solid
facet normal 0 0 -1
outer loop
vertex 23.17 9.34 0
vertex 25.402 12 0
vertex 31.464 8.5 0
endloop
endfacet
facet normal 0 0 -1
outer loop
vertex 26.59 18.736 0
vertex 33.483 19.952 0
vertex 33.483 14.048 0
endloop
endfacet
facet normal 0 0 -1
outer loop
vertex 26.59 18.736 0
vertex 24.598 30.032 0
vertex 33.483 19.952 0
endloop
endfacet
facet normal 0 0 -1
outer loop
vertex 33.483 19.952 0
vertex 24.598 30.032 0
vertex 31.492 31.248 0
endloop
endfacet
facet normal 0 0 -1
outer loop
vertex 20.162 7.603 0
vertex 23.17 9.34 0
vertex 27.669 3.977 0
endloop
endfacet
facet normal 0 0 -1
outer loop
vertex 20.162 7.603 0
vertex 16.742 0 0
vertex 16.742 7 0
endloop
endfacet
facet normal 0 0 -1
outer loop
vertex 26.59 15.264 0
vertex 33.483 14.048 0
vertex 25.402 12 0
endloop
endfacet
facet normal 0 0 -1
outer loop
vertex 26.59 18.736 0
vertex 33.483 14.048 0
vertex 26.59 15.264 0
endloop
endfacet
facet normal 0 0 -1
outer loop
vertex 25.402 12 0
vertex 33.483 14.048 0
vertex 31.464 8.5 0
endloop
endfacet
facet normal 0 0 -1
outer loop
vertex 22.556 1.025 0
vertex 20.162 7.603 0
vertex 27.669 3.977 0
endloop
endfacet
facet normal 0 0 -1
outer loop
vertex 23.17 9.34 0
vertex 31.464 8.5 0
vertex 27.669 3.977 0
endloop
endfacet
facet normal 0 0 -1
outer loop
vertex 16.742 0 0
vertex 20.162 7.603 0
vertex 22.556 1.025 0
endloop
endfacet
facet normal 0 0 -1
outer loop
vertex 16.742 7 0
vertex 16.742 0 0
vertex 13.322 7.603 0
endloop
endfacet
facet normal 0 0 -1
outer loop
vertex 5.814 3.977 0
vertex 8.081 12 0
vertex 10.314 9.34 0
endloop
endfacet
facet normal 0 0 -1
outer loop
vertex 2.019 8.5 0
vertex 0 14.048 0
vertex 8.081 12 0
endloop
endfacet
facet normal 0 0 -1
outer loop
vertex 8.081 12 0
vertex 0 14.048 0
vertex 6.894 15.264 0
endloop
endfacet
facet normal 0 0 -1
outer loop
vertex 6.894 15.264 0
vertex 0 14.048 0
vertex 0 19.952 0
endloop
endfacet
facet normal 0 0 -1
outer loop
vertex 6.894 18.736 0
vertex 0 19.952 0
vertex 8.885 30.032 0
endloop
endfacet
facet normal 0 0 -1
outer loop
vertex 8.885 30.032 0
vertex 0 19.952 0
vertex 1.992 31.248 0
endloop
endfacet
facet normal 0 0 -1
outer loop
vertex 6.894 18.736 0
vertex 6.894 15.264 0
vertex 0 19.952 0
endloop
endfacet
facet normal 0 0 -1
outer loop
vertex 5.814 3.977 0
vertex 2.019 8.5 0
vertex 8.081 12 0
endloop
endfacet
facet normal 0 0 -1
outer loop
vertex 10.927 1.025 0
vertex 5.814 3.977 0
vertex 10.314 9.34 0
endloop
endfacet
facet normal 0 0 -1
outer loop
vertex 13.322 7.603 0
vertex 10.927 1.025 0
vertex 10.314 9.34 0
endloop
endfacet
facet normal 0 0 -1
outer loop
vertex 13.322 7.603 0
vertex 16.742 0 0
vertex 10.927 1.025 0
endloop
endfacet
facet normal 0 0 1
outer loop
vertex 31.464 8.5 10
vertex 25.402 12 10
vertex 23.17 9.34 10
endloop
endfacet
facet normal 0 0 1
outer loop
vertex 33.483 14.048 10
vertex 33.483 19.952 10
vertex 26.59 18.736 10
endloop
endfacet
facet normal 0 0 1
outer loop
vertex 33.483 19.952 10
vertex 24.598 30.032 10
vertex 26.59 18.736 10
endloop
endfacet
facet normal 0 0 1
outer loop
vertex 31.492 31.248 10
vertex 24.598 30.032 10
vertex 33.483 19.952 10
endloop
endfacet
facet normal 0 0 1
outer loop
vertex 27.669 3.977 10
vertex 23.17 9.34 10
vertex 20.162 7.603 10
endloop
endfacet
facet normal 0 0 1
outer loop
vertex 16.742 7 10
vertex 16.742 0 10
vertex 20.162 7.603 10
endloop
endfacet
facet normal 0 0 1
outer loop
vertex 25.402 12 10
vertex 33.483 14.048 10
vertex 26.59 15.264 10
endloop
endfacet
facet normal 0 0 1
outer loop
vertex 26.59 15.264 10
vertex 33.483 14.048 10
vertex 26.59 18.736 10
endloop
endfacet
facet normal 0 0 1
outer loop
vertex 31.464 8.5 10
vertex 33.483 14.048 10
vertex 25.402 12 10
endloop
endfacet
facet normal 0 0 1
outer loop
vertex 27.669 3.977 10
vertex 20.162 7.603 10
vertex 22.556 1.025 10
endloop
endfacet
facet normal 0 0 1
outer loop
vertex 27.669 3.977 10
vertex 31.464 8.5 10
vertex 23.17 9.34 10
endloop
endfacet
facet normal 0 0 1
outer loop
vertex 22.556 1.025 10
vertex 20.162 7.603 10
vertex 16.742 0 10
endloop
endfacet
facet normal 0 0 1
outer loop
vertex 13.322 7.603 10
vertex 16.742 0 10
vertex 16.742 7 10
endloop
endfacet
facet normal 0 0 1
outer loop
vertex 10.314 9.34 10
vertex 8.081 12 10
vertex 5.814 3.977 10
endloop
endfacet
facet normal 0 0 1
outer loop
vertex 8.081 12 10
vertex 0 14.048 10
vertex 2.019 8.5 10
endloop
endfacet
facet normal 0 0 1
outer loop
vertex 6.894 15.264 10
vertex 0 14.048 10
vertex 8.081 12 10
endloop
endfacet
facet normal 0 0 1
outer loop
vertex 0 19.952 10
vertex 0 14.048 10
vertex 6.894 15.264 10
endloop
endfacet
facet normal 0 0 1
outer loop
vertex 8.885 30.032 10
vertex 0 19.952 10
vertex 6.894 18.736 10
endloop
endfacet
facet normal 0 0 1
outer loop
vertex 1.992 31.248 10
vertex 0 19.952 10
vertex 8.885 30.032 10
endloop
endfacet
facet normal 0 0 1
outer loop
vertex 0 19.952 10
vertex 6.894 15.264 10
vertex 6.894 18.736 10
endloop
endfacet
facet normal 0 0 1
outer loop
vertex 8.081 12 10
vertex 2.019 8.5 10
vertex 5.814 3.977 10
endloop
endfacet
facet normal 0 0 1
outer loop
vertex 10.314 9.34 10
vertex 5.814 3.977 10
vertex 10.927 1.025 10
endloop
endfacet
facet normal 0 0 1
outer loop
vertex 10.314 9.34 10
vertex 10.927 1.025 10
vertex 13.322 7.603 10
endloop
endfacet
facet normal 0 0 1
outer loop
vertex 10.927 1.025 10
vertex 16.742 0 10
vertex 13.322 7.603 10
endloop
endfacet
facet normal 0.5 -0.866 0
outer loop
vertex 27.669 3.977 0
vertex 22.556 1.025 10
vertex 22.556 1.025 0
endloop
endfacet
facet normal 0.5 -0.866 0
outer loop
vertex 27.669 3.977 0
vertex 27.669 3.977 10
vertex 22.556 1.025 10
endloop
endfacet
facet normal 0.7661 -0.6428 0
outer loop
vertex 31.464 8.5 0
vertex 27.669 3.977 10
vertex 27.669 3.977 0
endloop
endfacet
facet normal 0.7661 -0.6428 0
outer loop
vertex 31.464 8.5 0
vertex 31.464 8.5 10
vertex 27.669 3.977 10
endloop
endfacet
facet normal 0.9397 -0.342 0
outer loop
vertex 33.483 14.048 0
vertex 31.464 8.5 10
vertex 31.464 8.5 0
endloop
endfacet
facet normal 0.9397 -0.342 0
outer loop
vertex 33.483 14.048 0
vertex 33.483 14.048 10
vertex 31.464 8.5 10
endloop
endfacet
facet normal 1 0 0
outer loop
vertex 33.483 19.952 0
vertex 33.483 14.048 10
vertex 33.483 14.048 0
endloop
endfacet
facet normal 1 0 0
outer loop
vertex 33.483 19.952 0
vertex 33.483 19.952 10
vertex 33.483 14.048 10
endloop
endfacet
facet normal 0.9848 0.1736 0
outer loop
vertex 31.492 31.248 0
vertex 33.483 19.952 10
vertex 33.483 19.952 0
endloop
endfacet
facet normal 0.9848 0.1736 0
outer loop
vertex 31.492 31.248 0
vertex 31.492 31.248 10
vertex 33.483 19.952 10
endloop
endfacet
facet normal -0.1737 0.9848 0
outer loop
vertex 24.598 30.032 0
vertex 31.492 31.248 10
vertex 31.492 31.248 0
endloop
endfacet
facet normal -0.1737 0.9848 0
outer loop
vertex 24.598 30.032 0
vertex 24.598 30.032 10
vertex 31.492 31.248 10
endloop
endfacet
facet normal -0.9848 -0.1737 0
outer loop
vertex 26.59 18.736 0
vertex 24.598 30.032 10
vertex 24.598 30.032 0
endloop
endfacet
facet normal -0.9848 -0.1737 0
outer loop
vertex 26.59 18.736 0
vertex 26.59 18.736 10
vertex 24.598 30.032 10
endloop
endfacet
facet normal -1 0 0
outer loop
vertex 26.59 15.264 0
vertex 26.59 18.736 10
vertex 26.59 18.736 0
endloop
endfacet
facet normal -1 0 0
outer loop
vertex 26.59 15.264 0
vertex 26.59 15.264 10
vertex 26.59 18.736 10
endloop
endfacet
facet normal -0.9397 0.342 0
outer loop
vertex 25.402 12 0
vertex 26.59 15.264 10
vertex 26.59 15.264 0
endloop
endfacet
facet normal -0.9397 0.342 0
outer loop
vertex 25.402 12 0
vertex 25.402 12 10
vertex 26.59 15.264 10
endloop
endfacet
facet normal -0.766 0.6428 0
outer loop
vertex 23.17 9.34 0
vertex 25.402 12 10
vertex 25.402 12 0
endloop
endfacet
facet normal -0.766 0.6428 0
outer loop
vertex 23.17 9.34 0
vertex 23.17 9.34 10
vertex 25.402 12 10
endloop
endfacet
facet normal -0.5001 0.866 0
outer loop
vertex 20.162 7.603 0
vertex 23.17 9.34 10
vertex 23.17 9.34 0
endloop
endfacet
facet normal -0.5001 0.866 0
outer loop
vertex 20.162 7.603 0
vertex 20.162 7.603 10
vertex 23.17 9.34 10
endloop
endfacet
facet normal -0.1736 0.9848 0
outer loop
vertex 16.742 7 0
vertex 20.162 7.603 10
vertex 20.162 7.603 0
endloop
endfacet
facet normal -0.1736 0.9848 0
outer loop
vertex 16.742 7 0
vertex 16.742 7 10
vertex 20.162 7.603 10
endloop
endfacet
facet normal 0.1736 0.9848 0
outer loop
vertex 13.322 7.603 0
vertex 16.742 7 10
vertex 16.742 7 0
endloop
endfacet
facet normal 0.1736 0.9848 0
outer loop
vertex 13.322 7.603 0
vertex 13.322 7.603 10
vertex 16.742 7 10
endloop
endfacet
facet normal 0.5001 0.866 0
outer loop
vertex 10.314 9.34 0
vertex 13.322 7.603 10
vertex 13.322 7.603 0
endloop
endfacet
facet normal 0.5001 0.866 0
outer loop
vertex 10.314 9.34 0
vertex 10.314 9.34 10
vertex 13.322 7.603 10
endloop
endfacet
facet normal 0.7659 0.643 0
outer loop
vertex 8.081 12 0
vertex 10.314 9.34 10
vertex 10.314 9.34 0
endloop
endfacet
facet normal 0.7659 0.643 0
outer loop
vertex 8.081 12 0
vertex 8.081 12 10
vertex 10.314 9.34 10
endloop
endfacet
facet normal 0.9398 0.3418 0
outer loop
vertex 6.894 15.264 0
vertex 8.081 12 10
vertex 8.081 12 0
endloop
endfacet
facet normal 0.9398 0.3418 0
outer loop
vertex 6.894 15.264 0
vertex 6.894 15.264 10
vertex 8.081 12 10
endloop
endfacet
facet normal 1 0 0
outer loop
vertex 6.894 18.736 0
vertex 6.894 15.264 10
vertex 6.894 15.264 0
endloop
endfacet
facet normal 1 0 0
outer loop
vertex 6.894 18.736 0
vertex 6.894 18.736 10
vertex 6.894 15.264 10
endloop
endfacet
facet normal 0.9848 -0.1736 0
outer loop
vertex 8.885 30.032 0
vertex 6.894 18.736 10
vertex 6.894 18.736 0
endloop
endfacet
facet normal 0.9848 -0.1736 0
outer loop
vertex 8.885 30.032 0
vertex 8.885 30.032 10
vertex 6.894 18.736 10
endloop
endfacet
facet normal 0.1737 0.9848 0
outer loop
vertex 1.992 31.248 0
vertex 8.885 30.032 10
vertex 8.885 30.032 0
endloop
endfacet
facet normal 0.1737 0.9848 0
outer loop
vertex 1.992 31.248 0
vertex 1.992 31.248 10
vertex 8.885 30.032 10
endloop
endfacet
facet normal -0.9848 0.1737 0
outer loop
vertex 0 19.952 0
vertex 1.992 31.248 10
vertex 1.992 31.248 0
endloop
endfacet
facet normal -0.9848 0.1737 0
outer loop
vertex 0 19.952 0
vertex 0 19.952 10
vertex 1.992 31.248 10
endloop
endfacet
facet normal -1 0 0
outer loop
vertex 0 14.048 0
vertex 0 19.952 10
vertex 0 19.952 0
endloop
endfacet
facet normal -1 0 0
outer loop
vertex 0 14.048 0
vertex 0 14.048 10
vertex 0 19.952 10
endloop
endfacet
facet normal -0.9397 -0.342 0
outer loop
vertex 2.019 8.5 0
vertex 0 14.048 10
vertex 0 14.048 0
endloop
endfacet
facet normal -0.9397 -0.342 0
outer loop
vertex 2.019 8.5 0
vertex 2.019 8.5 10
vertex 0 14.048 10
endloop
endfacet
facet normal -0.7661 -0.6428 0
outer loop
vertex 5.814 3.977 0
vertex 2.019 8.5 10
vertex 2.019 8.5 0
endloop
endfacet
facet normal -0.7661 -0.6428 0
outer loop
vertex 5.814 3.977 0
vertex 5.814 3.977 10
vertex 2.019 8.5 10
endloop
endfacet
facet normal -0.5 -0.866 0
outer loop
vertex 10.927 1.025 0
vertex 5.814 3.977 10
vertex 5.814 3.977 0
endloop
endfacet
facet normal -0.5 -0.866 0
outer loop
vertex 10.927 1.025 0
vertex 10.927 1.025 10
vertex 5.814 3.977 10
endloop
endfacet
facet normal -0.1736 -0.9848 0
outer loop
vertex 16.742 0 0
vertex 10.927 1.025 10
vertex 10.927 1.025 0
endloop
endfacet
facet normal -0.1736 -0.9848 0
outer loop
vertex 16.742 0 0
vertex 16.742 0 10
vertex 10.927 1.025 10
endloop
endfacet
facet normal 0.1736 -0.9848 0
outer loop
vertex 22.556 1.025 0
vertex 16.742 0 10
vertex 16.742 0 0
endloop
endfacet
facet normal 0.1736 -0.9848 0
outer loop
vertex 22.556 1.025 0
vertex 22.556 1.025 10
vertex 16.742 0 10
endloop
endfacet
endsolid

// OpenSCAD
$fn = 32;

// ----------------------------------------------------------------------
// Clip blank: omega clip, 10 mm thick
// ----------------------------------------------------------------------

// --- parameters (mm) ---
profile_height = 10;      // extrusion height
profile_points = 26;      // points of the closed outline

profile = [[0, 19.952], [0, 14.048], [2.019, 8.5], [5.814, 3.977], [10.927, 1.025], [16.742, 0], [22.556, 1.025], [27.669, 3.977], [31.464, 8.5], [33.483, 14.048], [33.483, 19.952], [31.492, 31.248], [24.598, 30.032], [26.59, 18.736], [26.59, 15.264], [25.402, 12], [23.17, 9.34], [20.162, 7.603], [16.742, 7], [13.322, 7.603], [10.314, 9.34], [8.081, 12], [6.894, 15.264], [6.894, 18.736], [8.885, 30.032], [1.992, 31.248]];  // single closed polygon, 26 points, counter clockwise

// --- the one profile operation ---
linear_extrude(height = profile_height) polygon(points = profile);
